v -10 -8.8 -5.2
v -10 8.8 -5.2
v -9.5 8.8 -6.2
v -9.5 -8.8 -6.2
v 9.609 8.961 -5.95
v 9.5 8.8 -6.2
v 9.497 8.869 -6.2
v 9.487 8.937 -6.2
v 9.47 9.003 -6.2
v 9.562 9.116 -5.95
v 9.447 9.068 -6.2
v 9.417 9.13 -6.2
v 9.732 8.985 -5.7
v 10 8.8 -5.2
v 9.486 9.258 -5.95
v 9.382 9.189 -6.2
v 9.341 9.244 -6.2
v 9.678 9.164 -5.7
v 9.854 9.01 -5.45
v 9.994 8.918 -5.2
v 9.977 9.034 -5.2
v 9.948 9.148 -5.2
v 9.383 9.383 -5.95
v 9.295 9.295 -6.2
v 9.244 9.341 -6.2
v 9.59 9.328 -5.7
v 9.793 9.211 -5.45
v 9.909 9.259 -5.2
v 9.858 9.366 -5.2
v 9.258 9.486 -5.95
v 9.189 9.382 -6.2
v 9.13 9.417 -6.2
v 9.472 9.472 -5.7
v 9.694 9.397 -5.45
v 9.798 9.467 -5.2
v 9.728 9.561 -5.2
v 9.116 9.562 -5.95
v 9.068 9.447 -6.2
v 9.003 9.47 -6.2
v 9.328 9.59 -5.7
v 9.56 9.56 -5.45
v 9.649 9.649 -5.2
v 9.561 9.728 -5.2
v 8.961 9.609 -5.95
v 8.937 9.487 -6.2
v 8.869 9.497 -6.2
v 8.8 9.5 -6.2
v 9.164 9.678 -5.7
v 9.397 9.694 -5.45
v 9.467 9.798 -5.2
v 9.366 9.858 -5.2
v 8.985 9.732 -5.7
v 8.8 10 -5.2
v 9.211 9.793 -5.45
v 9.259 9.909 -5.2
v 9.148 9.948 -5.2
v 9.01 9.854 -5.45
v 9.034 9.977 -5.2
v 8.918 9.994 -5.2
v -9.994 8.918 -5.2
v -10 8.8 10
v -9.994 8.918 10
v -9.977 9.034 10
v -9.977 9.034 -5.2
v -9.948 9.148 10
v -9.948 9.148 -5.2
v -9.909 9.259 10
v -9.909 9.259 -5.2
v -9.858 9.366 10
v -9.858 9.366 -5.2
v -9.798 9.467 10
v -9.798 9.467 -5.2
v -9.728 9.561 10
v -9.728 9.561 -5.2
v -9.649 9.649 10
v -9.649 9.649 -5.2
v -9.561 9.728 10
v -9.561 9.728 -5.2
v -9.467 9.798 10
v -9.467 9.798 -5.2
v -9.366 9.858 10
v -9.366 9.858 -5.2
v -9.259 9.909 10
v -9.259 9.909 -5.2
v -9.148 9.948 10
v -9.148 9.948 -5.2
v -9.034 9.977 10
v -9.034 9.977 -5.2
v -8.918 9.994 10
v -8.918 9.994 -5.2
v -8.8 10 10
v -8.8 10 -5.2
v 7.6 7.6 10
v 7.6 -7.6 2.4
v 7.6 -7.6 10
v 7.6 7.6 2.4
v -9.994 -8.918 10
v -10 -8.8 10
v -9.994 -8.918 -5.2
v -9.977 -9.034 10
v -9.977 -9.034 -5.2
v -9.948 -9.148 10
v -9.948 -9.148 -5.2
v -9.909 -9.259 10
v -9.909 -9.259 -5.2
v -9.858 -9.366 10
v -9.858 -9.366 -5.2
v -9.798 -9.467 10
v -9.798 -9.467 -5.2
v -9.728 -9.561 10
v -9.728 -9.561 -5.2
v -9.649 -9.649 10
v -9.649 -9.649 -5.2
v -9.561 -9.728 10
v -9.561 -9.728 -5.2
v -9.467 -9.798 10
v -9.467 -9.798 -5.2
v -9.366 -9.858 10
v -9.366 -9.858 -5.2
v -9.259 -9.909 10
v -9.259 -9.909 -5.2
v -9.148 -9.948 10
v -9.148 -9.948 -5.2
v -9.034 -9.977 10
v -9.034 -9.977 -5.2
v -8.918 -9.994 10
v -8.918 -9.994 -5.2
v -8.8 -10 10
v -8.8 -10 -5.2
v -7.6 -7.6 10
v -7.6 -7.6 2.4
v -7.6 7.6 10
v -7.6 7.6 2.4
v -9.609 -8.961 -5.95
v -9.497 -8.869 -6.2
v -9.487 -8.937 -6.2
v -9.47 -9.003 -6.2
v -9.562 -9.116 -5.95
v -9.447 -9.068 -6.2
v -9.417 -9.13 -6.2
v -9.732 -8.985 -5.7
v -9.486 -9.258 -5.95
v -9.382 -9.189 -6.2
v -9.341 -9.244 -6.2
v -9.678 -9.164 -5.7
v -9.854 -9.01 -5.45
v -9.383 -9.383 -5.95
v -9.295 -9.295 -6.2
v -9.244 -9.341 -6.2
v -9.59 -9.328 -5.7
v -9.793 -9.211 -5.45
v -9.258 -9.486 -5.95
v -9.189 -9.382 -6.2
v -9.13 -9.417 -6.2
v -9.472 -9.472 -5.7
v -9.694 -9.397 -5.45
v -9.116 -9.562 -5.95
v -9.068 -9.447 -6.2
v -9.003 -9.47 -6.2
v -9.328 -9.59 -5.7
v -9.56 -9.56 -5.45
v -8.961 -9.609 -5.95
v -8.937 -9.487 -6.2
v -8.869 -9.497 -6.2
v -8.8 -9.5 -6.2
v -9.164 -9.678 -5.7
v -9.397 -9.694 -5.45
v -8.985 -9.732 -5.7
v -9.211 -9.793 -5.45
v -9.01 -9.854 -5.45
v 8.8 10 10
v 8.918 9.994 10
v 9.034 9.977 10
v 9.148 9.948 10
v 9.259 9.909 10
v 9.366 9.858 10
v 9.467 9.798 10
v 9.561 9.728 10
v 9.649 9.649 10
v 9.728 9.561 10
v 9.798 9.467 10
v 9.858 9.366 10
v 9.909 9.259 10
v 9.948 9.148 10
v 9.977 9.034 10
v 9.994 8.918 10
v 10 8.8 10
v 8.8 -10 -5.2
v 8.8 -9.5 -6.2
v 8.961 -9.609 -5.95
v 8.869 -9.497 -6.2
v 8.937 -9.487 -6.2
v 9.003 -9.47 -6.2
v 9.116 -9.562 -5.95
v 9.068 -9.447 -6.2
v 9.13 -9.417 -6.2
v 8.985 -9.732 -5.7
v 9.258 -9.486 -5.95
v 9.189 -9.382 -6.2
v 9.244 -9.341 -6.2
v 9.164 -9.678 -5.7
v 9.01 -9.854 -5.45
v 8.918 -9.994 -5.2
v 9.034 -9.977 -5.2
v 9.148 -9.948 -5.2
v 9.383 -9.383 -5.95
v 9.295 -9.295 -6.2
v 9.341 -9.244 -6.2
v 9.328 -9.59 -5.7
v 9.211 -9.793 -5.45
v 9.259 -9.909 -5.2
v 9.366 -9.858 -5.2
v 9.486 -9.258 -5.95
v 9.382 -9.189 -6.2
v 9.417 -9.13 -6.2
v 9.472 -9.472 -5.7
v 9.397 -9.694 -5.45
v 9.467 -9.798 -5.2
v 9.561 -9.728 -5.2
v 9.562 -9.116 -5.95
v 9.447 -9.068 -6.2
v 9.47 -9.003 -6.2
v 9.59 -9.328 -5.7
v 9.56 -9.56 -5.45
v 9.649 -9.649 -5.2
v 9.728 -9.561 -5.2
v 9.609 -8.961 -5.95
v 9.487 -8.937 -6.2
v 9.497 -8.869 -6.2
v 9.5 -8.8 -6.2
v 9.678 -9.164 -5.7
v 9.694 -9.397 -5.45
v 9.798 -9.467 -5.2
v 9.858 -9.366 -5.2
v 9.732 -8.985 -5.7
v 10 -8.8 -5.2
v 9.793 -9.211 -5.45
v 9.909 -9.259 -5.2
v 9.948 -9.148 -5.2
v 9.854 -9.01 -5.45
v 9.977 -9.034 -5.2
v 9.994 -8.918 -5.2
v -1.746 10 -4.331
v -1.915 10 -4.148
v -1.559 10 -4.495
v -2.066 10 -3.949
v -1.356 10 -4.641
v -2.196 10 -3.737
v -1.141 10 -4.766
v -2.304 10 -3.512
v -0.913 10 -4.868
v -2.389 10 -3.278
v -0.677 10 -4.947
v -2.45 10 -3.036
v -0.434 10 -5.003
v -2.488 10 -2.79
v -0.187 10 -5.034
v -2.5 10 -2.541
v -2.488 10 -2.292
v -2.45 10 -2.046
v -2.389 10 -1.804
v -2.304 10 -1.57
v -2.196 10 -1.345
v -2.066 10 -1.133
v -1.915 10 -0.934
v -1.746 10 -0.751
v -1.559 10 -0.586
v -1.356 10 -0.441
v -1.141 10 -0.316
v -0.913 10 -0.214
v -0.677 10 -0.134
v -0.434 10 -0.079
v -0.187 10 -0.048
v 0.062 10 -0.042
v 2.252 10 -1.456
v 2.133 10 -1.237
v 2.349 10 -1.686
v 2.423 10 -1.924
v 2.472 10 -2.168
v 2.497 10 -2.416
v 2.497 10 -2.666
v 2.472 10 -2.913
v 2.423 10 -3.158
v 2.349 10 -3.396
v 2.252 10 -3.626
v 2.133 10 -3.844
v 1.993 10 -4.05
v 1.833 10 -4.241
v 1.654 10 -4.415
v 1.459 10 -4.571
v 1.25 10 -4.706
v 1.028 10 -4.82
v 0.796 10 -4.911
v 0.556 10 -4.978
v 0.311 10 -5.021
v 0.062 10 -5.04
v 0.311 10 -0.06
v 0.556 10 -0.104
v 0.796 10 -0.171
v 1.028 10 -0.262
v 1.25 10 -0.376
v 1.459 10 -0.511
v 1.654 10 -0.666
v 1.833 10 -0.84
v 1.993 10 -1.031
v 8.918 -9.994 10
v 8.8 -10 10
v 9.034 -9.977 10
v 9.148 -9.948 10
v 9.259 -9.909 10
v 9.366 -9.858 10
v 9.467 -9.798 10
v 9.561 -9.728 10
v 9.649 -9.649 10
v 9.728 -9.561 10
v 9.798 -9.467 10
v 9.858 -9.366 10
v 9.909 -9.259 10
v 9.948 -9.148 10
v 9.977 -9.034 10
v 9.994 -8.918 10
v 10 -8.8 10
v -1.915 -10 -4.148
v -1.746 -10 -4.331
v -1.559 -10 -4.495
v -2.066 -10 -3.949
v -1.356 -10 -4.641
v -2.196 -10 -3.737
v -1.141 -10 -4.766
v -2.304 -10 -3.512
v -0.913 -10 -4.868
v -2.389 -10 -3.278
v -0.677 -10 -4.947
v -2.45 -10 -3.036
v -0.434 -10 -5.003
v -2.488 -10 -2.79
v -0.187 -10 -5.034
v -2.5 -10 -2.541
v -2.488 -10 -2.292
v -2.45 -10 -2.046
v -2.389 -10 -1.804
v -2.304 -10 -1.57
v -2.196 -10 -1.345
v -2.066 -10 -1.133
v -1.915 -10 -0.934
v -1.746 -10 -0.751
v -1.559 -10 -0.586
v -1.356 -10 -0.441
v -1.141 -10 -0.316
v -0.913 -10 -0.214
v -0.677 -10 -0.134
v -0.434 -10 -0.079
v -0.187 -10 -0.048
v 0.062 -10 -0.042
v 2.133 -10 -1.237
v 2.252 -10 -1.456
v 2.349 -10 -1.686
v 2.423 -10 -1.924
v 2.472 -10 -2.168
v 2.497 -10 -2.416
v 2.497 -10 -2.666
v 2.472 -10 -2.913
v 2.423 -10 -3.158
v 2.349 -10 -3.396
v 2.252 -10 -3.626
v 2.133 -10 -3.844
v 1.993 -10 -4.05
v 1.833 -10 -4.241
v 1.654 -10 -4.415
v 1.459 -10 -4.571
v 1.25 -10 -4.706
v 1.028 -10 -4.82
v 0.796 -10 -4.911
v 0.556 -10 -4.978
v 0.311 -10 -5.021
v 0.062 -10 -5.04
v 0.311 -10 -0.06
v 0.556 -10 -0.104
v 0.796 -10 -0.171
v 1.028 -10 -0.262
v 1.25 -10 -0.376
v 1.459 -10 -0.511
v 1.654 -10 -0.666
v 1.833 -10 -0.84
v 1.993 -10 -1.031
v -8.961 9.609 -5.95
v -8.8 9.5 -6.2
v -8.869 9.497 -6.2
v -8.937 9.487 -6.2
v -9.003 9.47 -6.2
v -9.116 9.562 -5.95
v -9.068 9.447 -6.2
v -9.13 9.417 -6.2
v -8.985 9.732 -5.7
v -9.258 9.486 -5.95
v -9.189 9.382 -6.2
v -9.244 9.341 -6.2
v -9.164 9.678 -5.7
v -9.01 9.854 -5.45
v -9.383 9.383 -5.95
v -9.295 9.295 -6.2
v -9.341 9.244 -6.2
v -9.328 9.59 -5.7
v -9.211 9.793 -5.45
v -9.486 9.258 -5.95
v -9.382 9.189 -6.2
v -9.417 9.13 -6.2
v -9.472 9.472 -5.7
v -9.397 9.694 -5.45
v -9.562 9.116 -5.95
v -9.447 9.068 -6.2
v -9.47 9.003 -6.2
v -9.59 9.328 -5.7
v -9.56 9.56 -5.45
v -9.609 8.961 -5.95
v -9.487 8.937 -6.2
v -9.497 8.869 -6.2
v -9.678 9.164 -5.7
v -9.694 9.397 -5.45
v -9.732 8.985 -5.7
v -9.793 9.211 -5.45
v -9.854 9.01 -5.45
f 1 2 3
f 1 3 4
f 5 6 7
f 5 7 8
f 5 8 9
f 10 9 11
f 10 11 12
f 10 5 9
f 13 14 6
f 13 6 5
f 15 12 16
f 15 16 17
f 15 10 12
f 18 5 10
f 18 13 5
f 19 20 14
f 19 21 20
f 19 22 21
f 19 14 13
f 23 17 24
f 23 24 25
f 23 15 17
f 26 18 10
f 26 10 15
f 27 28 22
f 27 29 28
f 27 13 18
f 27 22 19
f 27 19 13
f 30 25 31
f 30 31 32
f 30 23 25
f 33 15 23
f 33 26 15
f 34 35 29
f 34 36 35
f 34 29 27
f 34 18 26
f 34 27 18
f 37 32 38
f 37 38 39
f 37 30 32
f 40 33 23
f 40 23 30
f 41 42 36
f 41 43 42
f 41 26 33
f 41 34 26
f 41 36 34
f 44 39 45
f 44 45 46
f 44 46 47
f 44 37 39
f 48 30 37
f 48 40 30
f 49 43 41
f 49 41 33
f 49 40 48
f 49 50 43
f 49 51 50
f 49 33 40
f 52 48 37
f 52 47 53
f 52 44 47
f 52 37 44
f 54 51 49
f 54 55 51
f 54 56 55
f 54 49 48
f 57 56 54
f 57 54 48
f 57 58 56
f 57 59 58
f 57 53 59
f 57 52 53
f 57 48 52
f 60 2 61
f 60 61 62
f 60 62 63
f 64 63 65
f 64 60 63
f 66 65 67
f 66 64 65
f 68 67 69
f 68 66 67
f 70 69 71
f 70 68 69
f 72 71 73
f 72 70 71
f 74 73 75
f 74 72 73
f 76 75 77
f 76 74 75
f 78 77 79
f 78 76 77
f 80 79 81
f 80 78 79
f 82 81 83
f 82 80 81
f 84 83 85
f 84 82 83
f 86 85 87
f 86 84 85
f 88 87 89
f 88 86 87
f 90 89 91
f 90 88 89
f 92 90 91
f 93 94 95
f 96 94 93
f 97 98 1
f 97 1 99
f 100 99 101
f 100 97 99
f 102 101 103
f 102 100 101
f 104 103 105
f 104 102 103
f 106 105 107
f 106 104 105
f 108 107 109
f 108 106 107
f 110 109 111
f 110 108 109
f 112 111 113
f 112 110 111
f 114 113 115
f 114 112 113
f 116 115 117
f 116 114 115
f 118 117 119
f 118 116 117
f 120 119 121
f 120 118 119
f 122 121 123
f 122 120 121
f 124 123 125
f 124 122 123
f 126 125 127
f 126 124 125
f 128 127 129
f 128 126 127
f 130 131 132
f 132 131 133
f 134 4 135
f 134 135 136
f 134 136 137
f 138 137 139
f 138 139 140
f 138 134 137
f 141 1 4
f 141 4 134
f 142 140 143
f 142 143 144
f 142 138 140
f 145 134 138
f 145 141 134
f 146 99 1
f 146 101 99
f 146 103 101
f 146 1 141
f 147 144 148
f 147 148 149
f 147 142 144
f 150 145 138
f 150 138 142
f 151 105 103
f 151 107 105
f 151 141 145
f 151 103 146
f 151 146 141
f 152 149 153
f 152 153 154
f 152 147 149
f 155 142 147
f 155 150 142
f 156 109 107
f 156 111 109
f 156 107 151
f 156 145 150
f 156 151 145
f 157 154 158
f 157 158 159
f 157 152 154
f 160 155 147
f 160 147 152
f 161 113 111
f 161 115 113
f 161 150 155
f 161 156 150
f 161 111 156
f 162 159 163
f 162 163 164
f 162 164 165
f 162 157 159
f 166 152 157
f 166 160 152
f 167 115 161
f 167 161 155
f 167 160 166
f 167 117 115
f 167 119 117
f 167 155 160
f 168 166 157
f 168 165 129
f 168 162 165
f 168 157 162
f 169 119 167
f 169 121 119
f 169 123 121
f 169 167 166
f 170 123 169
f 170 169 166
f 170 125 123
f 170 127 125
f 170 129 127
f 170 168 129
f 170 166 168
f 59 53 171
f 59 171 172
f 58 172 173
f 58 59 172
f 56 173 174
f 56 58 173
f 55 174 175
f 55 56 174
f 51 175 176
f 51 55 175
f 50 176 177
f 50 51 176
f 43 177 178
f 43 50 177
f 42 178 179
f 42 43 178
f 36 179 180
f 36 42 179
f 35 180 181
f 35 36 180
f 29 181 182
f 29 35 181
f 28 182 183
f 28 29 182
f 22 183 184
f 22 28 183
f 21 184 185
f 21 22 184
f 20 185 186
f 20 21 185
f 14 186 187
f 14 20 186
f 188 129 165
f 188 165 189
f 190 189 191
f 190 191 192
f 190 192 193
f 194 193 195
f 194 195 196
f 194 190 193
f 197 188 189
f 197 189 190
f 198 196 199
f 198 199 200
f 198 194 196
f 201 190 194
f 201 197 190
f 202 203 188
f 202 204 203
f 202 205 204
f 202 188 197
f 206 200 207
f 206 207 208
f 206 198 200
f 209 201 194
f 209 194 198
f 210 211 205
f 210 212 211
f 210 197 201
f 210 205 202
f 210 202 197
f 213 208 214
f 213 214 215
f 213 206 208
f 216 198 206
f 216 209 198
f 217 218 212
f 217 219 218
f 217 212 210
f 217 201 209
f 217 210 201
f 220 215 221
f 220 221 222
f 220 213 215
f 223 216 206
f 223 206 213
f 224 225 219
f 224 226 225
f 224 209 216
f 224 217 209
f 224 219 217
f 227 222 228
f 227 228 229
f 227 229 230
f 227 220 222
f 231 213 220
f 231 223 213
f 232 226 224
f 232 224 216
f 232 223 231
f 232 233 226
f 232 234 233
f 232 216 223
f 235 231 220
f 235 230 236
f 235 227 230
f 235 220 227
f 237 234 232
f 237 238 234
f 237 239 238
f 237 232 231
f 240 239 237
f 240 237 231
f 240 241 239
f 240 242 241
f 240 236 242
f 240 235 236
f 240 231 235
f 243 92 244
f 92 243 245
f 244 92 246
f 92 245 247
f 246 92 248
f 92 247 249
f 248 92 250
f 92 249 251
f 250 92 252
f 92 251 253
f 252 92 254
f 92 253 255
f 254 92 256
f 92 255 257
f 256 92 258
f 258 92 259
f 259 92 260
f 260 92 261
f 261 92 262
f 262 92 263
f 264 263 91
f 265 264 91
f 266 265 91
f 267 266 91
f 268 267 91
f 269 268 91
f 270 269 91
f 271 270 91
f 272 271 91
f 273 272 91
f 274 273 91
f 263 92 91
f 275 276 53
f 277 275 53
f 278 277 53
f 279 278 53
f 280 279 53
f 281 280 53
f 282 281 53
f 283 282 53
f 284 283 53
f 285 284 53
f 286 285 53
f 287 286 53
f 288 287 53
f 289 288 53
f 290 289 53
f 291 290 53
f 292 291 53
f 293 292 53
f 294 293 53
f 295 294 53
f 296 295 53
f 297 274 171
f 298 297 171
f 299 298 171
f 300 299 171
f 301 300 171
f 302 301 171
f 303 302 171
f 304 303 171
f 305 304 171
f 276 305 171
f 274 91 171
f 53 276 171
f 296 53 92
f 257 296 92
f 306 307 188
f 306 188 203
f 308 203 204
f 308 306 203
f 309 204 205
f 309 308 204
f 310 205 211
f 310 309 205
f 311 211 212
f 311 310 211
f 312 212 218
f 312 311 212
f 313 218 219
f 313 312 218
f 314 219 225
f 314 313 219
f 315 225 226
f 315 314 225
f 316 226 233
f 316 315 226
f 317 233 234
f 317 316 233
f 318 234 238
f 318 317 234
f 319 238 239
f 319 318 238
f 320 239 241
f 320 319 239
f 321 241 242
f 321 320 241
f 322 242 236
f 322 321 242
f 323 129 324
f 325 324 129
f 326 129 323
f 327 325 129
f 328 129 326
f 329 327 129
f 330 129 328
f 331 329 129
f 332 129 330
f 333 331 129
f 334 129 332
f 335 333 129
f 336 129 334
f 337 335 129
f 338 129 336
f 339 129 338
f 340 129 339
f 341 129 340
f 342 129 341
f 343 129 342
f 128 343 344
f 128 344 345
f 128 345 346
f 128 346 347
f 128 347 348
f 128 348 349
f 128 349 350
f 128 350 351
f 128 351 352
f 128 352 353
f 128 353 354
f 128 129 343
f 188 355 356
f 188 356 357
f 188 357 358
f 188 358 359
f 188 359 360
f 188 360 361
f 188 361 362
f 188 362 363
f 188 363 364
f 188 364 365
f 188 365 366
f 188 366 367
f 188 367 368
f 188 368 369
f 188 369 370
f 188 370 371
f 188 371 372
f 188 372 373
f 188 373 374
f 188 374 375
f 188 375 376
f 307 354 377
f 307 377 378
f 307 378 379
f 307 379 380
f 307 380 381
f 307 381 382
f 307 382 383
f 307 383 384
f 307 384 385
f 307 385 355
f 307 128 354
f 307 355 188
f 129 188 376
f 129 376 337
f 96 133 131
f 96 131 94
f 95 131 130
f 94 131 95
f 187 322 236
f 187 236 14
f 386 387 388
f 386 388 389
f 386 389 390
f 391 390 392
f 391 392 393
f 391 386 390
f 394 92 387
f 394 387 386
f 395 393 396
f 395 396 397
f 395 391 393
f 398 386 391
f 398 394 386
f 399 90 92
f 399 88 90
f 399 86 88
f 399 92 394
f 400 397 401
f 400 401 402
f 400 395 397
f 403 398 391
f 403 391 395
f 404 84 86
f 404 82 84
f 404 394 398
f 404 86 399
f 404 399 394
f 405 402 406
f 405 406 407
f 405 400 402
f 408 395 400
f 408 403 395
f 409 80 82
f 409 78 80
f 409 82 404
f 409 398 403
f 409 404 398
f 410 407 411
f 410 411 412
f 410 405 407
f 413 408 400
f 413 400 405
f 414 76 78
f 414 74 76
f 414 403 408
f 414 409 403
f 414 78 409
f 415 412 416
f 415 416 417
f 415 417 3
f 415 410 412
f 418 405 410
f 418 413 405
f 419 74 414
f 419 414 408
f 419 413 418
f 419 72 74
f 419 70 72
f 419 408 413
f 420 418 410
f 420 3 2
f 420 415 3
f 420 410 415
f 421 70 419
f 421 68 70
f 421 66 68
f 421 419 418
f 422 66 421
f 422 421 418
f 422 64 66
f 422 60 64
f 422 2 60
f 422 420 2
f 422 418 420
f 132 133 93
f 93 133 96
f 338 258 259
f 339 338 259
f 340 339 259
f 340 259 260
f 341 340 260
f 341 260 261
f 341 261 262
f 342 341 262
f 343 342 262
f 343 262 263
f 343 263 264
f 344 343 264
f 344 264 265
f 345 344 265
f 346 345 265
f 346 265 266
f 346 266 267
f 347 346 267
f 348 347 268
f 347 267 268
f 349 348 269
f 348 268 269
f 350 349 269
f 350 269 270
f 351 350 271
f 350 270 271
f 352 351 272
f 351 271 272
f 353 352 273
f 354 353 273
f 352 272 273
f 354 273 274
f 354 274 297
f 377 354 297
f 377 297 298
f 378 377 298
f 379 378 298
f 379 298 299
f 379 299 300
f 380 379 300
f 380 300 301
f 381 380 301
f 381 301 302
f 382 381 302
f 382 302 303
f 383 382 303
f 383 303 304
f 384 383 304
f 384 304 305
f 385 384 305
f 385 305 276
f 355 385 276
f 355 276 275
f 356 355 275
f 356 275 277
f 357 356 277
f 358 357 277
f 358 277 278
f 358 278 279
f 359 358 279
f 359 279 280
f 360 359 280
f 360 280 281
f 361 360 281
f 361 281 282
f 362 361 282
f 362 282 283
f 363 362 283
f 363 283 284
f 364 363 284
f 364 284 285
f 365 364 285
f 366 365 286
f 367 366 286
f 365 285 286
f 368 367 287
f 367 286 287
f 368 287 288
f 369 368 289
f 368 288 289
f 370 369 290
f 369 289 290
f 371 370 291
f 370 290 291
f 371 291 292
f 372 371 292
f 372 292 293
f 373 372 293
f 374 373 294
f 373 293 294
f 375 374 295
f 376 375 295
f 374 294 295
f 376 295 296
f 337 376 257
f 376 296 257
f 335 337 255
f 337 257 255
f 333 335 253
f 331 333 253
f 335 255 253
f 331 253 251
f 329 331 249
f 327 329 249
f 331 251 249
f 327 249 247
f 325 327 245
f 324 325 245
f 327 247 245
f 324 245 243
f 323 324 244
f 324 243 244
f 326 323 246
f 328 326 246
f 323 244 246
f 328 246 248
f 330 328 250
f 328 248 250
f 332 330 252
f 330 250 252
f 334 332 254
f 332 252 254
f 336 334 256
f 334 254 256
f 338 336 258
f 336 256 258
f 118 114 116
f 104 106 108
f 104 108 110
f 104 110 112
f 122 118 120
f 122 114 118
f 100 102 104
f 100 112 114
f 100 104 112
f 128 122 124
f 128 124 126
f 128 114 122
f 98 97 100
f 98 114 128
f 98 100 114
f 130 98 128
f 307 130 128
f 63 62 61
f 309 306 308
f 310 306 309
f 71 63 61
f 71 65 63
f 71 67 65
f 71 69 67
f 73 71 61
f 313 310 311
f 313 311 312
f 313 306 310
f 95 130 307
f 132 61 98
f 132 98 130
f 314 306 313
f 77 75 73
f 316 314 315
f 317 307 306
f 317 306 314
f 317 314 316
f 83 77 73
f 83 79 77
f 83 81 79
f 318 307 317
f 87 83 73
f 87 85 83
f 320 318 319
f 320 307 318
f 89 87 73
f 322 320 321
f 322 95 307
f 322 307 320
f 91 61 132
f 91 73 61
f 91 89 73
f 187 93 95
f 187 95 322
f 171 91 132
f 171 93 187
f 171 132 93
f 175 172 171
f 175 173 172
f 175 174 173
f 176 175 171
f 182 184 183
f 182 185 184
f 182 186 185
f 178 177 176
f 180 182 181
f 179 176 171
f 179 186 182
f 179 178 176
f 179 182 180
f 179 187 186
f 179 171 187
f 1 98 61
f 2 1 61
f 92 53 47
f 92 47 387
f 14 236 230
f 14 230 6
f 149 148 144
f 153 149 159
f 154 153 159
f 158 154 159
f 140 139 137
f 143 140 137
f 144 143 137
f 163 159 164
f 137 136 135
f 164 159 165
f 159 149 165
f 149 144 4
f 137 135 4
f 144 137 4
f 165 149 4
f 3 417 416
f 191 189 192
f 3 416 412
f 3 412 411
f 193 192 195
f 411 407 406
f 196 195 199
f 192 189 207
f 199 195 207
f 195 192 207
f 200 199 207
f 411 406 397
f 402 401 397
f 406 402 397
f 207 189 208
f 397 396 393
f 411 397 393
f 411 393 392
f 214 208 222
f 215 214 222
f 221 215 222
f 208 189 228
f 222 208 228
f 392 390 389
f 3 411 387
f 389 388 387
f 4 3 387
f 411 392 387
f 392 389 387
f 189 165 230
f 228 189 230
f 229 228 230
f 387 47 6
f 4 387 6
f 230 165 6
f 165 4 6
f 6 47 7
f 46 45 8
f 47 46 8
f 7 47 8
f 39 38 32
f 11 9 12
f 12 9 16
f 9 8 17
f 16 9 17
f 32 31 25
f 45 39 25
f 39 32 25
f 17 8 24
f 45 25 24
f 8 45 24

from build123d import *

# Parameters (mm, degrees)
F0_W     = 20
F0_H     = 20
F0_W_2   = 15.2
F0_H_2   = 15.2
F1_DEPTH = 10
F2_T     = -2.4
F3_DEPTH = 6.2
F4_R     = 2.5
F5_DEPTH = 20.001
F6_R     = 1.2
F7_SIZE2 = 1
F7_SIZE  = 0.5


with BuildPart() as f1:
    # F0 (on Top) → F1 (new body)
    with BuildSketch(Plane.XY):
        Rectangle(F0_W, F0_H)
        Rectangle(F0_W_2, F0_H_2, mode=Mode.SUBTRACT)
        Rectangle(F0_W_2, F0_H_2)
    extrude(amount=F1_DEPTH)

    # F2
    f2_openings = [f1.faces().sort_by_distance(p)[0] for p in [
        (0, 0, 10),
    ]]
    offset(amount=F2_T, openings=f2_openings)

    # F3 (add): a face of the model
    f3_faces = [f1.faces().sort_by_distance(p)[0] for p in [
        (0, 0, 0),
    ]]
    extrude(f3_faces, amount=F3_DEPTH)

    # F4 (on face) → F5 (cut, through all)
    with BuildSketch(Plane(origin=(0, 10, 0), x_dir=(-1, 0, 0), z_dir=(0, 1, 0))):
        with Locations((0, -2.5408927461)):
            Circle(F4_R)
    extrude(amount=-F5_DEPTH, mode=Mode.SUBTRACT)

    # F6
    f6_edges = [f1.edges().sort_by_distance(p)[0] for p in [
        (-10, 10, 1.9),
        (10, 10, 1.9),
        (10, -10, 1.9),
        (-10, -10, 1.9),
    ]]
    fillet(f6_edges, radius=F6_R)

    # F7
    f7_edges = [f1.edges().sort_by_distance(p)[0] for p in [
        (10, 0, -6.2),
        (9.648528, -9.648528, -6.2),
        (9.648528, 9.648528, -6.2),
        (0, -10, -6.2),
        (0, 10, -6.2),
        (-9.648528, -9.648528, -6.2),
        (-9.648528, 9.648528, -6.2),
        (-10, 0, -6.2),
    ]]
    f7_side = f1.faces().sort_by_distance((0, 0, -6.2))[0]
    chamfer(f7_edges, length=F7_SIZE, length2=F7_SIZE2, reference=f7_side)


solid = f1.part
